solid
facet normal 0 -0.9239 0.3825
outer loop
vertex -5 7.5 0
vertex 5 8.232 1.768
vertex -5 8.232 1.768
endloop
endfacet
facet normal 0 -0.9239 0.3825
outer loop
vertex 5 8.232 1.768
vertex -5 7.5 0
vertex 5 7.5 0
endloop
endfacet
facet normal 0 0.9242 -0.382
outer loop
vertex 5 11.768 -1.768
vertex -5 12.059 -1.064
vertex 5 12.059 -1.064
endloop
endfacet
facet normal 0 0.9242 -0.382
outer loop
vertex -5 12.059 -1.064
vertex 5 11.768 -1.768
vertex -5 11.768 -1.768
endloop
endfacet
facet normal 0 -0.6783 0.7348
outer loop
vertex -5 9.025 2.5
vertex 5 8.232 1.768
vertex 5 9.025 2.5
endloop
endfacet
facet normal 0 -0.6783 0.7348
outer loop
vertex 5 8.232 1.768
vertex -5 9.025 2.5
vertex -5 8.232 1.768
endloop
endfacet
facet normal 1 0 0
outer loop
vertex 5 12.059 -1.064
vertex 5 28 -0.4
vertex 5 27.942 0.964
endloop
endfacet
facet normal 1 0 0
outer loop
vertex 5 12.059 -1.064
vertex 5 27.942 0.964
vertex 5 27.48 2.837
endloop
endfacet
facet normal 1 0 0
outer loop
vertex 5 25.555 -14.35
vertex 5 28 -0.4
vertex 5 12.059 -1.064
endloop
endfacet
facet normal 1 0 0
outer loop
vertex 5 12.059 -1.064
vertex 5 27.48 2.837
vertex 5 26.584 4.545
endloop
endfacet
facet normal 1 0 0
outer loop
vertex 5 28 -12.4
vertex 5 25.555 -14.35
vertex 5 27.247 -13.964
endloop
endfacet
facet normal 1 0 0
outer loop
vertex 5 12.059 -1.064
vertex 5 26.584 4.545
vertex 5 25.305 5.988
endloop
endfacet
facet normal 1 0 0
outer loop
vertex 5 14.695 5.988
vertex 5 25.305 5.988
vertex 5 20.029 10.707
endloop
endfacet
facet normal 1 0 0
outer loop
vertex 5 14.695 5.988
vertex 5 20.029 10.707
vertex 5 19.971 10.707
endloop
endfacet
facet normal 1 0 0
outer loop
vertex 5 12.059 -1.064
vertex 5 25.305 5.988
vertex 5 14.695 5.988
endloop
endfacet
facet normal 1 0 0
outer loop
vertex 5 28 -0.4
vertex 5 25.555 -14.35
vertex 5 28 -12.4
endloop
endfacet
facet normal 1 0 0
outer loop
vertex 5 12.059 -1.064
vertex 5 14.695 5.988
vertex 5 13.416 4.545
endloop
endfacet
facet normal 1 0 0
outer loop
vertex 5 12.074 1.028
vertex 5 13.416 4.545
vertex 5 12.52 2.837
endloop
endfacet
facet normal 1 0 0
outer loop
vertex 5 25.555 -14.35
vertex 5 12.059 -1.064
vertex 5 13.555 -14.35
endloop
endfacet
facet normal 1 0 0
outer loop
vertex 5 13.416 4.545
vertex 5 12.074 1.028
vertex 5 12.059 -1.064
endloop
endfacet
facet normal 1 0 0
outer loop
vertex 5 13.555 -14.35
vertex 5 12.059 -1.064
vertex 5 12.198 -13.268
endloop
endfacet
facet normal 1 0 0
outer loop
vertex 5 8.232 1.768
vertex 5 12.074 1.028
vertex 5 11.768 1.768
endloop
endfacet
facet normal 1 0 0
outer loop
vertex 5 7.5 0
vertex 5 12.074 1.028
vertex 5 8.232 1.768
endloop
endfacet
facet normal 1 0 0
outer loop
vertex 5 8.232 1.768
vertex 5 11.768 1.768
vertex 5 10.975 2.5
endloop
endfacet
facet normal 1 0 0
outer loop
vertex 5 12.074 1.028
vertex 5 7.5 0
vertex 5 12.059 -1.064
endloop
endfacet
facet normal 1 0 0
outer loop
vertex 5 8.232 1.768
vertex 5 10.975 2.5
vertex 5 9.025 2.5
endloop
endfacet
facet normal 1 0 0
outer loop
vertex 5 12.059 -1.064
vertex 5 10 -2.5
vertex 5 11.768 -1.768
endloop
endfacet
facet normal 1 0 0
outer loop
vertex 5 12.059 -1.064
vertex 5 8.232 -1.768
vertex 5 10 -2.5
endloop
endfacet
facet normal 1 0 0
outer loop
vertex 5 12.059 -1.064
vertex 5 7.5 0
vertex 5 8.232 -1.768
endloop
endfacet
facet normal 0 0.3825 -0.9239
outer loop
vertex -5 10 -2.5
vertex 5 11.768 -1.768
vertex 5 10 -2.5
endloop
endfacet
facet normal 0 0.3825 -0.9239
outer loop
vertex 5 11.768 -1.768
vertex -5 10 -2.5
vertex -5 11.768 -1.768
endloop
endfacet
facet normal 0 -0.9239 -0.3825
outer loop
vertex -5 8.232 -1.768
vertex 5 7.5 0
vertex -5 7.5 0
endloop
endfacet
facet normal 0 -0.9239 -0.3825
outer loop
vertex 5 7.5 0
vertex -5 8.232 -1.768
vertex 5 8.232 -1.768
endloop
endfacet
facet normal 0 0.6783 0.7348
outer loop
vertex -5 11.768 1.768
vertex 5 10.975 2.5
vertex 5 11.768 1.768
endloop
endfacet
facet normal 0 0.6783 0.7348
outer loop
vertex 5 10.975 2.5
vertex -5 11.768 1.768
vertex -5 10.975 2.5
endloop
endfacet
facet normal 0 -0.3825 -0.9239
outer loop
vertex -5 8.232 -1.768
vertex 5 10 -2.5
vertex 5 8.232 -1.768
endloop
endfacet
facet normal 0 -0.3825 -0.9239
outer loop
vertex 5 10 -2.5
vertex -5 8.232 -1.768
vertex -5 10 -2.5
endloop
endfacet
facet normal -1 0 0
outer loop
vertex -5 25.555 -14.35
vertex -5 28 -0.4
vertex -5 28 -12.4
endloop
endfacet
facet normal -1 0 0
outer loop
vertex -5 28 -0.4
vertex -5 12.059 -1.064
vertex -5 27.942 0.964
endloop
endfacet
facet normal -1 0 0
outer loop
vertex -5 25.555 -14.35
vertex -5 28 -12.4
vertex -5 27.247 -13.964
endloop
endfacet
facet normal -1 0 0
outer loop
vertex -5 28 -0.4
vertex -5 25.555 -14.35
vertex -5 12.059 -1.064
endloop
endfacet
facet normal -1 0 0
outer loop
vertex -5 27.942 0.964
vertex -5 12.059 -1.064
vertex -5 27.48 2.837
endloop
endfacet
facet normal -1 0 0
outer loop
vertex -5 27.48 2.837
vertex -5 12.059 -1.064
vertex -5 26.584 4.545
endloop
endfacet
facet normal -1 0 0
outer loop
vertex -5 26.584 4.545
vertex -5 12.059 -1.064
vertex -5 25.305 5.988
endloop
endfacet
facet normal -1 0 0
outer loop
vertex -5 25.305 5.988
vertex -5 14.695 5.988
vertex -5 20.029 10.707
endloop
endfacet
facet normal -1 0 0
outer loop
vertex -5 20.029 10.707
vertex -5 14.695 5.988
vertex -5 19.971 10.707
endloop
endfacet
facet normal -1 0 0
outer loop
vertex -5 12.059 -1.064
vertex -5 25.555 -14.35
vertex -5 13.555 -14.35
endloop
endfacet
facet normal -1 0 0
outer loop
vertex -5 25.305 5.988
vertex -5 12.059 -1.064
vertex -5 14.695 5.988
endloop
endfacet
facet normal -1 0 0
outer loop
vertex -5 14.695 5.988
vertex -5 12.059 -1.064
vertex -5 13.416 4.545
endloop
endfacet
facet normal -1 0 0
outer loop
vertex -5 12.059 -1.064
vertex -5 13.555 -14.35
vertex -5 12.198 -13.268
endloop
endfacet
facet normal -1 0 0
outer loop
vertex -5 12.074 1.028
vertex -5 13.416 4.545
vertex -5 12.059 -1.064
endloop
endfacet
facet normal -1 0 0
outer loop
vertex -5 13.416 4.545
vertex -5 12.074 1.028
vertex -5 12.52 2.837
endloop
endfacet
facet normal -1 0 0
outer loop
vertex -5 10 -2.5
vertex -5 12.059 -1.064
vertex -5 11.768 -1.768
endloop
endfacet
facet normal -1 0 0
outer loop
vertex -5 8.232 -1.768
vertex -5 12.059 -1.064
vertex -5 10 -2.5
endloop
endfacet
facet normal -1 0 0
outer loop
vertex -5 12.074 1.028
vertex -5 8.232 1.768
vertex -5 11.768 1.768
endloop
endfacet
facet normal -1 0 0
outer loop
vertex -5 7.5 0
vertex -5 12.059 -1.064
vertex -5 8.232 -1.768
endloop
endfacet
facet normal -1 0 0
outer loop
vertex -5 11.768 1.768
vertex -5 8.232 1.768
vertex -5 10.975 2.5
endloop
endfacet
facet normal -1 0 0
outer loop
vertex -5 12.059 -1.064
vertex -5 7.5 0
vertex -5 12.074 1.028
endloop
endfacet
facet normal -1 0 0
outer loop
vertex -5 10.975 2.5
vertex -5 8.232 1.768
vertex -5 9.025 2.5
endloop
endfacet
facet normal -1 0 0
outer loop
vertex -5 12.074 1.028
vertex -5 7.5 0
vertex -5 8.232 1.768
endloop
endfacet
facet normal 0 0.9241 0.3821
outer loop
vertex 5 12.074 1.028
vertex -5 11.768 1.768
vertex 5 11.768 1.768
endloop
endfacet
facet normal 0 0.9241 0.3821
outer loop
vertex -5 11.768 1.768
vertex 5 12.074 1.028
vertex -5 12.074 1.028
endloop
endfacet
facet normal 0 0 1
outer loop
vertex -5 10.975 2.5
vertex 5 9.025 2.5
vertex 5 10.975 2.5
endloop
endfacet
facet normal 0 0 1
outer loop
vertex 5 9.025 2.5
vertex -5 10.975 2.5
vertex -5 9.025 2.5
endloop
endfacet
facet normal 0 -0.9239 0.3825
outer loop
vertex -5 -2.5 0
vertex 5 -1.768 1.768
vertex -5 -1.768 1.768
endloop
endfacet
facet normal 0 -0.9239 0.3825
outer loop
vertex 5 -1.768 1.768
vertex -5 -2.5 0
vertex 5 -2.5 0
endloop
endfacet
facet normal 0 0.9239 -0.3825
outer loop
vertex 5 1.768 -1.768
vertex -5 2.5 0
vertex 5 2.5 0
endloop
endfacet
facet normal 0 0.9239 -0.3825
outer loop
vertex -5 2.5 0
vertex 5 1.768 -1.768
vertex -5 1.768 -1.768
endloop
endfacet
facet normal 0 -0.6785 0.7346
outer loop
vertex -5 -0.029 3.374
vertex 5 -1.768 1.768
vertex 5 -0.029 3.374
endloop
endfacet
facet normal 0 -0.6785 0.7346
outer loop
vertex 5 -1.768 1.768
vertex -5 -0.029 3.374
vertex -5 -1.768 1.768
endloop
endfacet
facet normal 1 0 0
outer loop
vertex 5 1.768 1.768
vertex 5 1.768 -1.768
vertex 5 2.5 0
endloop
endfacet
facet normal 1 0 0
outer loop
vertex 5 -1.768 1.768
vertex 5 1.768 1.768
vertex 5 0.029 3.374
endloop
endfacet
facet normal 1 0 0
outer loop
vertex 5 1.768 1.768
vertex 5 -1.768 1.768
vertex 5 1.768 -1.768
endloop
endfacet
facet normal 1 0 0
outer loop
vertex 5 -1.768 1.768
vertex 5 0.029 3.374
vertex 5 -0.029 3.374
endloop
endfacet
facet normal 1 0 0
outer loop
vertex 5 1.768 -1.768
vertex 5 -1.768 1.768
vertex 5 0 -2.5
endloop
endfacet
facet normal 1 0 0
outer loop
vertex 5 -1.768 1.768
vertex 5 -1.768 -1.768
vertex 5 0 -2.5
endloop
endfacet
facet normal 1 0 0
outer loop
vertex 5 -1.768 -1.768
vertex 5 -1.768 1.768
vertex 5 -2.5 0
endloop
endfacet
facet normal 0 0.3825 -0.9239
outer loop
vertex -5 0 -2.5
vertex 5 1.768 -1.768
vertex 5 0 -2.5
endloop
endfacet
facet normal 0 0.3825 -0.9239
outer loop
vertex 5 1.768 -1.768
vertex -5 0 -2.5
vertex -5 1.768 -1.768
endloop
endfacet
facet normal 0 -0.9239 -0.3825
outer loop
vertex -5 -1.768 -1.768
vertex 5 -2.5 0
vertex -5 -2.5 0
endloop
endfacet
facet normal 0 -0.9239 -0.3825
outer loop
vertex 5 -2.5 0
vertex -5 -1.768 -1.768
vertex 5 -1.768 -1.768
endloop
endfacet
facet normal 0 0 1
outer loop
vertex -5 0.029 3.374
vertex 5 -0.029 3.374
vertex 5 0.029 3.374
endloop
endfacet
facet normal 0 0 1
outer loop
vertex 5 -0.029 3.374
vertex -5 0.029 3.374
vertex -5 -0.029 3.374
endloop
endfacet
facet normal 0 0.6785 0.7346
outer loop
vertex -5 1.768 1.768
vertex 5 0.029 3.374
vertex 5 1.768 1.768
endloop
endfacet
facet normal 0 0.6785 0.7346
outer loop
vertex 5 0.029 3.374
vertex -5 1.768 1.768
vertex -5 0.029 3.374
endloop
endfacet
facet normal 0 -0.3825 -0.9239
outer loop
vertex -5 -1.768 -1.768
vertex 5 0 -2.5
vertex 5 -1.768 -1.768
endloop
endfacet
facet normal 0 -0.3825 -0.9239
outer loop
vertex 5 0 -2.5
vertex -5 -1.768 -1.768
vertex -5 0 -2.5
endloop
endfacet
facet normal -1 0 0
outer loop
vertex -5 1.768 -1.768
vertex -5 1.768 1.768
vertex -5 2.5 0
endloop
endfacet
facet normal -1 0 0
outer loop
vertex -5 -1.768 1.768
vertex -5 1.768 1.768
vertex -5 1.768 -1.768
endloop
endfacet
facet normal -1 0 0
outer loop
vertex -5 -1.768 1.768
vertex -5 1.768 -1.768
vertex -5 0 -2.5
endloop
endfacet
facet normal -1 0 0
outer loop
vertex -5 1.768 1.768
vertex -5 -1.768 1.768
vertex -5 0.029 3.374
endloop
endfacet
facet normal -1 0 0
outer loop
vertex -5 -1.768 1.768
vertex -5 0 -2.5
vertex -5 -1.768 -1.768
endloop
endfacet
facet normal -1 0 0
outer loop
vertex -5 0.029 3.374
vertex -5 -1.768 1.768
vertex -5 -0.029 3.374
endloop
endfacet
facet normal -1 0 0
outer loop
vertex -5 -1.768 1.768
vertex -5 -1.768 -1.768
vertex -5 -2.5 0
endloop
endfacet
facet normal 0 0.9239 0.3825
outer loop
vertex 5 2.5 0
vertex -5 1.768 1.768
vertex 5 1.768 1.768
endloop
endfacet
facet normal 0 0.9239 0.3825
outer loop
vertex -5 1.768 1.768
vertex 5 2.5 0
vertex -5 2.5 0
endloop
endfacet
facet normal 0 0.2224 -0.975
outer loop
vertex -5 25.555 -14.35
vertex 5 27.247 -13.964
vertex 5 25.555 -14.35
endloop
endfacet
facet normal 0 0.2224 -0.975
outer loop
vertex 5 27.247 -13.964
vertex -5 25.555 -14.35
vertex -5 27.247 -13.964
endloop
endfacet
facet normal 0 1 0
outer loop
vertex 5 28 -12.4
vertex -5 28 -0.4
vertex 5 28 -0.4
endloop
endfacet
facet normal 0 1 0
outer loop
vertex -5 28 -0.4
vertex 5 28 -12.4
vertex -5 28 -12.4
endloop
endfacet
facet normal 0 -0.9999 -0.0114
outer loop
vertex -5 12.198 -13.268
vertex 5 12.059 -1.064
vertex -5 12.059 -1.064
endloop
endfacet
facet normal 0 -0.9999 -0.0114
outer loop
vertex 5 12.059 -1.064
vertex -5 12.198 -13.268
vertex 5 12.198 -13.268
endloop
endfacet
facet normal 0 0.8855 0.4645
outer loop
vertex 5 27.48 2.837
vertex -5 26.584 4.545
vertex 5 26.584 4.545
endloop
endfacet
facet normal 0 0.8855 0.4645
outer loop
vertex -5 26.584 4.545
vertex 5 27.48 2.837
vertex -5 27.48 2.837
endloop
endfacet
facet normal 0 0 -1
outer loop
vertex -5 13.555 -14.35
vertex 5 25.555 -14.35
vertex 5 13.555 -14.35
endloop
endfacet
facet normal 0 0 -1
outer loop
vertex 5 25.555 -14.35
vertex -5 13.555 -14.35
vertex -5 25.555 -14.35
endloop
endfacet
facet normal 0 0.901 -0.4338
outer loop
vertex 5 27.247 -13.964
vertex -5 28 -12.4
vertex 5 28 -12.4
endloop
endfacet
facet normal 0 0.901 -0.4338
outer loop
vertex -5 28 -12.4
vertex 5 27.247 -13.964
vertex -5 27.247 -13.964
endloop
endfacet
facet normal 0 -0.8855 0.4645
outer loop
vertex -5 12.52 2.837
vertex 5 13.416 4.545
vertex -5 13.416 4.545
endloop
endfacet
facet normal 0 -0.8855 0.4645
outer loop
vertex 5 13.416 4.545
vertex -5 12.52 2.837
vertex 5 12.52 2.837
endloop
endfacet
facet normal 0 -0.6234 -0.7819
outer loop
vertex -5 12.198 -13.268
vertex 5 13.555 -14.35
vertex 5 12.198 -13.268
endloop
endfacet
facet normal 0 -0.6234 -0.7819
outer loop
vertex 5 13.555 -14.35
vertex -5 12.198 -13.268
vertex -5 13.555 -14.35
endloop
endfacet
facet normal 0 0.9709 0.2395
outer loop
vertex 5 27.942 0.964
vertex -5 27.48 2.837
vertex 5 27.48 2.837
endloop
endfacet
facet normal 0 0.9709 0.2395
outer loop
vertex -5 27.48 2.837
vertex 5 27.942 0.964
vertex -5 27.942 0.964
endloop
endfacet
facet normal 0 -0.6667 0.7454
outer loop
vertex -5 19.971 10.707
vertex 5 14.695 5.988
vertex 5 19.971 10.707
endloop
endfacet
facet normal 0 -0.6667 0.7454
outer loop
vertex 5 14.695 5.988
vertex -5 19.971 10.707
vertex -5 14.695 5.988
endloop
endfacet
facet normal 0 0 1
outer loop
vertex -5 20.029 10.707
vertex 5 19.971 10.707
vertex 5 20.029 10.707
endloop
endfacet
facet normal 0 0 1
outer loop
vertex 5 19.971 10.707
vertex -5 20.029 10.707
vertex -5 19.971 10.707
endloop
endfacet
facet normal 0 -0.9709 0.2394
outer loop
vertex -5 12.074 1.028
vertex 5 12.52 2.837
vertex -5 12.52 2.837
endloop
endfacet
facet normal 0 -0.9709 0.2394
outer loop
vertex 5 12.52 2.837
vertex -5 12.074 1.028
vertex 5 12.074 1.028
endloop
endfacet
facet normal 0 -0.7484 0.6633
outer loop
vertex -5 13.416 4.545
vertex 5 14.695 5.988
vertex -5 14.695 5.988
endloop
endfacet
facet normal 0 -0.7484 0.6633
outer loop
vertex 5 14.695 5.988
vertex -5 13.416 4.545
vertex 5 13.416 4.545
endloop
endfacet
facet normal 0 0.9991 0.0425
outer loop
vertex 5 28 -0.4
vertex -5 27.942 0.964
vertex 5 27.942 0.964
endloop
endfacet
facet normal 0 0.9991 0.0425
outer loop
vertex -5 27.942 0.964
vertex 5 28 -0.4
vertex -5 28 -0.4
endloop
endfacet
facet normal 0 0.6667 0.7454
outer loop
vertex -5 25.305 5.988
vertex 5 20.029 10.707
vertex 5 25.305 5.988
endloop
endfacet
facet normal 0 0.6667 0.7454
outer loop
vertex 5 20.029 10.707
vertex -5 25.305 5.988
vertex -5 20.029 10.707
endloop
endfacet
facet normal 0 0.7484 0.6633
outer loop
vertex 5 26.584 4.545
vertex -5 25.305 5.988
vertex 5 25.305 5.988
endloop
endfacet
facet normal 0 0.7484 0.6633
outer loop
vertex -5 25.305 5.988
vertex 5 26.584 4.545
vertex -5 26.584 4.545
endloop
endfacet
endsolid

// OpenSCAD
tearDrop();

translate([0,10,0])
tearDrop(5,10,false);

translate([0,20,0])
tearDropFlatBottom(16,10,16);


module tearDrop(iDiameter=5, iLength=10, iPoint=true){
difference(){
  hull(){
    rotate([0,90,0])
      cylinder(h=iLength, d=iDiameter, center=true);
    translate([0,0,iDiameter-(iDiameter/3)])
    rotate([0,90,0])
      cylinder(h=iLength, d=.1, center=true);
    }
    if(iPoint==false){
      translate([0,0,iDiameter])
        cube([iLength+2,iDiameter,iDiameter],center=true);
    }    
  }
}
///////////////////////////////////////////////////////////
module tearDropFlatBottom(iDiameter=5, iDepth=10,iHeigth=5, iPoint=true){
difference(){
  hull(){
    rotate([0,90,0])
      cylinder(h=iDepth, d=iDiameter, center=true);
    translate([0,0,iDiameter-(iDiameter/3)])
    rotate([0,90,0])
      cylinder(h=iDepth, d=.1, center=true);
    translate([0,0,-iHeigth/2.5])
      rotate([90,0,90])
      plate4Point(iDiameter,iHeigth,iDepth,4);
    }
    if(iPoint==false){
      translate([0,0,iDiameter])
        cube([iDepth+2,iDiameter,iDiameter],center=true);
    }
  }
}
///////////////////////////////////////////////////////////
module plate4Point(x,y,z,d){
	hull(){
		color("green") translate([(x/2)-(d/2) ,(y/2) -(d/2),0]) cylinder(h=z, d=d, center=true);
		color("blue")  translate([(x/2)-(d/2) ,-(y/2)+(d/2),0]) cylinder(h=z, d=d, center=true);
		color("red")   translate([-(x/2)+(d/2),(y/2) -(d/2),0]) cylinder(h=z, d=d, center=true);
		color("grey")  translate([-(x/2)+(d/2),-(y/2)+(d/2),0]) cylinder(h=z, d=d, center=true);
	}
}
